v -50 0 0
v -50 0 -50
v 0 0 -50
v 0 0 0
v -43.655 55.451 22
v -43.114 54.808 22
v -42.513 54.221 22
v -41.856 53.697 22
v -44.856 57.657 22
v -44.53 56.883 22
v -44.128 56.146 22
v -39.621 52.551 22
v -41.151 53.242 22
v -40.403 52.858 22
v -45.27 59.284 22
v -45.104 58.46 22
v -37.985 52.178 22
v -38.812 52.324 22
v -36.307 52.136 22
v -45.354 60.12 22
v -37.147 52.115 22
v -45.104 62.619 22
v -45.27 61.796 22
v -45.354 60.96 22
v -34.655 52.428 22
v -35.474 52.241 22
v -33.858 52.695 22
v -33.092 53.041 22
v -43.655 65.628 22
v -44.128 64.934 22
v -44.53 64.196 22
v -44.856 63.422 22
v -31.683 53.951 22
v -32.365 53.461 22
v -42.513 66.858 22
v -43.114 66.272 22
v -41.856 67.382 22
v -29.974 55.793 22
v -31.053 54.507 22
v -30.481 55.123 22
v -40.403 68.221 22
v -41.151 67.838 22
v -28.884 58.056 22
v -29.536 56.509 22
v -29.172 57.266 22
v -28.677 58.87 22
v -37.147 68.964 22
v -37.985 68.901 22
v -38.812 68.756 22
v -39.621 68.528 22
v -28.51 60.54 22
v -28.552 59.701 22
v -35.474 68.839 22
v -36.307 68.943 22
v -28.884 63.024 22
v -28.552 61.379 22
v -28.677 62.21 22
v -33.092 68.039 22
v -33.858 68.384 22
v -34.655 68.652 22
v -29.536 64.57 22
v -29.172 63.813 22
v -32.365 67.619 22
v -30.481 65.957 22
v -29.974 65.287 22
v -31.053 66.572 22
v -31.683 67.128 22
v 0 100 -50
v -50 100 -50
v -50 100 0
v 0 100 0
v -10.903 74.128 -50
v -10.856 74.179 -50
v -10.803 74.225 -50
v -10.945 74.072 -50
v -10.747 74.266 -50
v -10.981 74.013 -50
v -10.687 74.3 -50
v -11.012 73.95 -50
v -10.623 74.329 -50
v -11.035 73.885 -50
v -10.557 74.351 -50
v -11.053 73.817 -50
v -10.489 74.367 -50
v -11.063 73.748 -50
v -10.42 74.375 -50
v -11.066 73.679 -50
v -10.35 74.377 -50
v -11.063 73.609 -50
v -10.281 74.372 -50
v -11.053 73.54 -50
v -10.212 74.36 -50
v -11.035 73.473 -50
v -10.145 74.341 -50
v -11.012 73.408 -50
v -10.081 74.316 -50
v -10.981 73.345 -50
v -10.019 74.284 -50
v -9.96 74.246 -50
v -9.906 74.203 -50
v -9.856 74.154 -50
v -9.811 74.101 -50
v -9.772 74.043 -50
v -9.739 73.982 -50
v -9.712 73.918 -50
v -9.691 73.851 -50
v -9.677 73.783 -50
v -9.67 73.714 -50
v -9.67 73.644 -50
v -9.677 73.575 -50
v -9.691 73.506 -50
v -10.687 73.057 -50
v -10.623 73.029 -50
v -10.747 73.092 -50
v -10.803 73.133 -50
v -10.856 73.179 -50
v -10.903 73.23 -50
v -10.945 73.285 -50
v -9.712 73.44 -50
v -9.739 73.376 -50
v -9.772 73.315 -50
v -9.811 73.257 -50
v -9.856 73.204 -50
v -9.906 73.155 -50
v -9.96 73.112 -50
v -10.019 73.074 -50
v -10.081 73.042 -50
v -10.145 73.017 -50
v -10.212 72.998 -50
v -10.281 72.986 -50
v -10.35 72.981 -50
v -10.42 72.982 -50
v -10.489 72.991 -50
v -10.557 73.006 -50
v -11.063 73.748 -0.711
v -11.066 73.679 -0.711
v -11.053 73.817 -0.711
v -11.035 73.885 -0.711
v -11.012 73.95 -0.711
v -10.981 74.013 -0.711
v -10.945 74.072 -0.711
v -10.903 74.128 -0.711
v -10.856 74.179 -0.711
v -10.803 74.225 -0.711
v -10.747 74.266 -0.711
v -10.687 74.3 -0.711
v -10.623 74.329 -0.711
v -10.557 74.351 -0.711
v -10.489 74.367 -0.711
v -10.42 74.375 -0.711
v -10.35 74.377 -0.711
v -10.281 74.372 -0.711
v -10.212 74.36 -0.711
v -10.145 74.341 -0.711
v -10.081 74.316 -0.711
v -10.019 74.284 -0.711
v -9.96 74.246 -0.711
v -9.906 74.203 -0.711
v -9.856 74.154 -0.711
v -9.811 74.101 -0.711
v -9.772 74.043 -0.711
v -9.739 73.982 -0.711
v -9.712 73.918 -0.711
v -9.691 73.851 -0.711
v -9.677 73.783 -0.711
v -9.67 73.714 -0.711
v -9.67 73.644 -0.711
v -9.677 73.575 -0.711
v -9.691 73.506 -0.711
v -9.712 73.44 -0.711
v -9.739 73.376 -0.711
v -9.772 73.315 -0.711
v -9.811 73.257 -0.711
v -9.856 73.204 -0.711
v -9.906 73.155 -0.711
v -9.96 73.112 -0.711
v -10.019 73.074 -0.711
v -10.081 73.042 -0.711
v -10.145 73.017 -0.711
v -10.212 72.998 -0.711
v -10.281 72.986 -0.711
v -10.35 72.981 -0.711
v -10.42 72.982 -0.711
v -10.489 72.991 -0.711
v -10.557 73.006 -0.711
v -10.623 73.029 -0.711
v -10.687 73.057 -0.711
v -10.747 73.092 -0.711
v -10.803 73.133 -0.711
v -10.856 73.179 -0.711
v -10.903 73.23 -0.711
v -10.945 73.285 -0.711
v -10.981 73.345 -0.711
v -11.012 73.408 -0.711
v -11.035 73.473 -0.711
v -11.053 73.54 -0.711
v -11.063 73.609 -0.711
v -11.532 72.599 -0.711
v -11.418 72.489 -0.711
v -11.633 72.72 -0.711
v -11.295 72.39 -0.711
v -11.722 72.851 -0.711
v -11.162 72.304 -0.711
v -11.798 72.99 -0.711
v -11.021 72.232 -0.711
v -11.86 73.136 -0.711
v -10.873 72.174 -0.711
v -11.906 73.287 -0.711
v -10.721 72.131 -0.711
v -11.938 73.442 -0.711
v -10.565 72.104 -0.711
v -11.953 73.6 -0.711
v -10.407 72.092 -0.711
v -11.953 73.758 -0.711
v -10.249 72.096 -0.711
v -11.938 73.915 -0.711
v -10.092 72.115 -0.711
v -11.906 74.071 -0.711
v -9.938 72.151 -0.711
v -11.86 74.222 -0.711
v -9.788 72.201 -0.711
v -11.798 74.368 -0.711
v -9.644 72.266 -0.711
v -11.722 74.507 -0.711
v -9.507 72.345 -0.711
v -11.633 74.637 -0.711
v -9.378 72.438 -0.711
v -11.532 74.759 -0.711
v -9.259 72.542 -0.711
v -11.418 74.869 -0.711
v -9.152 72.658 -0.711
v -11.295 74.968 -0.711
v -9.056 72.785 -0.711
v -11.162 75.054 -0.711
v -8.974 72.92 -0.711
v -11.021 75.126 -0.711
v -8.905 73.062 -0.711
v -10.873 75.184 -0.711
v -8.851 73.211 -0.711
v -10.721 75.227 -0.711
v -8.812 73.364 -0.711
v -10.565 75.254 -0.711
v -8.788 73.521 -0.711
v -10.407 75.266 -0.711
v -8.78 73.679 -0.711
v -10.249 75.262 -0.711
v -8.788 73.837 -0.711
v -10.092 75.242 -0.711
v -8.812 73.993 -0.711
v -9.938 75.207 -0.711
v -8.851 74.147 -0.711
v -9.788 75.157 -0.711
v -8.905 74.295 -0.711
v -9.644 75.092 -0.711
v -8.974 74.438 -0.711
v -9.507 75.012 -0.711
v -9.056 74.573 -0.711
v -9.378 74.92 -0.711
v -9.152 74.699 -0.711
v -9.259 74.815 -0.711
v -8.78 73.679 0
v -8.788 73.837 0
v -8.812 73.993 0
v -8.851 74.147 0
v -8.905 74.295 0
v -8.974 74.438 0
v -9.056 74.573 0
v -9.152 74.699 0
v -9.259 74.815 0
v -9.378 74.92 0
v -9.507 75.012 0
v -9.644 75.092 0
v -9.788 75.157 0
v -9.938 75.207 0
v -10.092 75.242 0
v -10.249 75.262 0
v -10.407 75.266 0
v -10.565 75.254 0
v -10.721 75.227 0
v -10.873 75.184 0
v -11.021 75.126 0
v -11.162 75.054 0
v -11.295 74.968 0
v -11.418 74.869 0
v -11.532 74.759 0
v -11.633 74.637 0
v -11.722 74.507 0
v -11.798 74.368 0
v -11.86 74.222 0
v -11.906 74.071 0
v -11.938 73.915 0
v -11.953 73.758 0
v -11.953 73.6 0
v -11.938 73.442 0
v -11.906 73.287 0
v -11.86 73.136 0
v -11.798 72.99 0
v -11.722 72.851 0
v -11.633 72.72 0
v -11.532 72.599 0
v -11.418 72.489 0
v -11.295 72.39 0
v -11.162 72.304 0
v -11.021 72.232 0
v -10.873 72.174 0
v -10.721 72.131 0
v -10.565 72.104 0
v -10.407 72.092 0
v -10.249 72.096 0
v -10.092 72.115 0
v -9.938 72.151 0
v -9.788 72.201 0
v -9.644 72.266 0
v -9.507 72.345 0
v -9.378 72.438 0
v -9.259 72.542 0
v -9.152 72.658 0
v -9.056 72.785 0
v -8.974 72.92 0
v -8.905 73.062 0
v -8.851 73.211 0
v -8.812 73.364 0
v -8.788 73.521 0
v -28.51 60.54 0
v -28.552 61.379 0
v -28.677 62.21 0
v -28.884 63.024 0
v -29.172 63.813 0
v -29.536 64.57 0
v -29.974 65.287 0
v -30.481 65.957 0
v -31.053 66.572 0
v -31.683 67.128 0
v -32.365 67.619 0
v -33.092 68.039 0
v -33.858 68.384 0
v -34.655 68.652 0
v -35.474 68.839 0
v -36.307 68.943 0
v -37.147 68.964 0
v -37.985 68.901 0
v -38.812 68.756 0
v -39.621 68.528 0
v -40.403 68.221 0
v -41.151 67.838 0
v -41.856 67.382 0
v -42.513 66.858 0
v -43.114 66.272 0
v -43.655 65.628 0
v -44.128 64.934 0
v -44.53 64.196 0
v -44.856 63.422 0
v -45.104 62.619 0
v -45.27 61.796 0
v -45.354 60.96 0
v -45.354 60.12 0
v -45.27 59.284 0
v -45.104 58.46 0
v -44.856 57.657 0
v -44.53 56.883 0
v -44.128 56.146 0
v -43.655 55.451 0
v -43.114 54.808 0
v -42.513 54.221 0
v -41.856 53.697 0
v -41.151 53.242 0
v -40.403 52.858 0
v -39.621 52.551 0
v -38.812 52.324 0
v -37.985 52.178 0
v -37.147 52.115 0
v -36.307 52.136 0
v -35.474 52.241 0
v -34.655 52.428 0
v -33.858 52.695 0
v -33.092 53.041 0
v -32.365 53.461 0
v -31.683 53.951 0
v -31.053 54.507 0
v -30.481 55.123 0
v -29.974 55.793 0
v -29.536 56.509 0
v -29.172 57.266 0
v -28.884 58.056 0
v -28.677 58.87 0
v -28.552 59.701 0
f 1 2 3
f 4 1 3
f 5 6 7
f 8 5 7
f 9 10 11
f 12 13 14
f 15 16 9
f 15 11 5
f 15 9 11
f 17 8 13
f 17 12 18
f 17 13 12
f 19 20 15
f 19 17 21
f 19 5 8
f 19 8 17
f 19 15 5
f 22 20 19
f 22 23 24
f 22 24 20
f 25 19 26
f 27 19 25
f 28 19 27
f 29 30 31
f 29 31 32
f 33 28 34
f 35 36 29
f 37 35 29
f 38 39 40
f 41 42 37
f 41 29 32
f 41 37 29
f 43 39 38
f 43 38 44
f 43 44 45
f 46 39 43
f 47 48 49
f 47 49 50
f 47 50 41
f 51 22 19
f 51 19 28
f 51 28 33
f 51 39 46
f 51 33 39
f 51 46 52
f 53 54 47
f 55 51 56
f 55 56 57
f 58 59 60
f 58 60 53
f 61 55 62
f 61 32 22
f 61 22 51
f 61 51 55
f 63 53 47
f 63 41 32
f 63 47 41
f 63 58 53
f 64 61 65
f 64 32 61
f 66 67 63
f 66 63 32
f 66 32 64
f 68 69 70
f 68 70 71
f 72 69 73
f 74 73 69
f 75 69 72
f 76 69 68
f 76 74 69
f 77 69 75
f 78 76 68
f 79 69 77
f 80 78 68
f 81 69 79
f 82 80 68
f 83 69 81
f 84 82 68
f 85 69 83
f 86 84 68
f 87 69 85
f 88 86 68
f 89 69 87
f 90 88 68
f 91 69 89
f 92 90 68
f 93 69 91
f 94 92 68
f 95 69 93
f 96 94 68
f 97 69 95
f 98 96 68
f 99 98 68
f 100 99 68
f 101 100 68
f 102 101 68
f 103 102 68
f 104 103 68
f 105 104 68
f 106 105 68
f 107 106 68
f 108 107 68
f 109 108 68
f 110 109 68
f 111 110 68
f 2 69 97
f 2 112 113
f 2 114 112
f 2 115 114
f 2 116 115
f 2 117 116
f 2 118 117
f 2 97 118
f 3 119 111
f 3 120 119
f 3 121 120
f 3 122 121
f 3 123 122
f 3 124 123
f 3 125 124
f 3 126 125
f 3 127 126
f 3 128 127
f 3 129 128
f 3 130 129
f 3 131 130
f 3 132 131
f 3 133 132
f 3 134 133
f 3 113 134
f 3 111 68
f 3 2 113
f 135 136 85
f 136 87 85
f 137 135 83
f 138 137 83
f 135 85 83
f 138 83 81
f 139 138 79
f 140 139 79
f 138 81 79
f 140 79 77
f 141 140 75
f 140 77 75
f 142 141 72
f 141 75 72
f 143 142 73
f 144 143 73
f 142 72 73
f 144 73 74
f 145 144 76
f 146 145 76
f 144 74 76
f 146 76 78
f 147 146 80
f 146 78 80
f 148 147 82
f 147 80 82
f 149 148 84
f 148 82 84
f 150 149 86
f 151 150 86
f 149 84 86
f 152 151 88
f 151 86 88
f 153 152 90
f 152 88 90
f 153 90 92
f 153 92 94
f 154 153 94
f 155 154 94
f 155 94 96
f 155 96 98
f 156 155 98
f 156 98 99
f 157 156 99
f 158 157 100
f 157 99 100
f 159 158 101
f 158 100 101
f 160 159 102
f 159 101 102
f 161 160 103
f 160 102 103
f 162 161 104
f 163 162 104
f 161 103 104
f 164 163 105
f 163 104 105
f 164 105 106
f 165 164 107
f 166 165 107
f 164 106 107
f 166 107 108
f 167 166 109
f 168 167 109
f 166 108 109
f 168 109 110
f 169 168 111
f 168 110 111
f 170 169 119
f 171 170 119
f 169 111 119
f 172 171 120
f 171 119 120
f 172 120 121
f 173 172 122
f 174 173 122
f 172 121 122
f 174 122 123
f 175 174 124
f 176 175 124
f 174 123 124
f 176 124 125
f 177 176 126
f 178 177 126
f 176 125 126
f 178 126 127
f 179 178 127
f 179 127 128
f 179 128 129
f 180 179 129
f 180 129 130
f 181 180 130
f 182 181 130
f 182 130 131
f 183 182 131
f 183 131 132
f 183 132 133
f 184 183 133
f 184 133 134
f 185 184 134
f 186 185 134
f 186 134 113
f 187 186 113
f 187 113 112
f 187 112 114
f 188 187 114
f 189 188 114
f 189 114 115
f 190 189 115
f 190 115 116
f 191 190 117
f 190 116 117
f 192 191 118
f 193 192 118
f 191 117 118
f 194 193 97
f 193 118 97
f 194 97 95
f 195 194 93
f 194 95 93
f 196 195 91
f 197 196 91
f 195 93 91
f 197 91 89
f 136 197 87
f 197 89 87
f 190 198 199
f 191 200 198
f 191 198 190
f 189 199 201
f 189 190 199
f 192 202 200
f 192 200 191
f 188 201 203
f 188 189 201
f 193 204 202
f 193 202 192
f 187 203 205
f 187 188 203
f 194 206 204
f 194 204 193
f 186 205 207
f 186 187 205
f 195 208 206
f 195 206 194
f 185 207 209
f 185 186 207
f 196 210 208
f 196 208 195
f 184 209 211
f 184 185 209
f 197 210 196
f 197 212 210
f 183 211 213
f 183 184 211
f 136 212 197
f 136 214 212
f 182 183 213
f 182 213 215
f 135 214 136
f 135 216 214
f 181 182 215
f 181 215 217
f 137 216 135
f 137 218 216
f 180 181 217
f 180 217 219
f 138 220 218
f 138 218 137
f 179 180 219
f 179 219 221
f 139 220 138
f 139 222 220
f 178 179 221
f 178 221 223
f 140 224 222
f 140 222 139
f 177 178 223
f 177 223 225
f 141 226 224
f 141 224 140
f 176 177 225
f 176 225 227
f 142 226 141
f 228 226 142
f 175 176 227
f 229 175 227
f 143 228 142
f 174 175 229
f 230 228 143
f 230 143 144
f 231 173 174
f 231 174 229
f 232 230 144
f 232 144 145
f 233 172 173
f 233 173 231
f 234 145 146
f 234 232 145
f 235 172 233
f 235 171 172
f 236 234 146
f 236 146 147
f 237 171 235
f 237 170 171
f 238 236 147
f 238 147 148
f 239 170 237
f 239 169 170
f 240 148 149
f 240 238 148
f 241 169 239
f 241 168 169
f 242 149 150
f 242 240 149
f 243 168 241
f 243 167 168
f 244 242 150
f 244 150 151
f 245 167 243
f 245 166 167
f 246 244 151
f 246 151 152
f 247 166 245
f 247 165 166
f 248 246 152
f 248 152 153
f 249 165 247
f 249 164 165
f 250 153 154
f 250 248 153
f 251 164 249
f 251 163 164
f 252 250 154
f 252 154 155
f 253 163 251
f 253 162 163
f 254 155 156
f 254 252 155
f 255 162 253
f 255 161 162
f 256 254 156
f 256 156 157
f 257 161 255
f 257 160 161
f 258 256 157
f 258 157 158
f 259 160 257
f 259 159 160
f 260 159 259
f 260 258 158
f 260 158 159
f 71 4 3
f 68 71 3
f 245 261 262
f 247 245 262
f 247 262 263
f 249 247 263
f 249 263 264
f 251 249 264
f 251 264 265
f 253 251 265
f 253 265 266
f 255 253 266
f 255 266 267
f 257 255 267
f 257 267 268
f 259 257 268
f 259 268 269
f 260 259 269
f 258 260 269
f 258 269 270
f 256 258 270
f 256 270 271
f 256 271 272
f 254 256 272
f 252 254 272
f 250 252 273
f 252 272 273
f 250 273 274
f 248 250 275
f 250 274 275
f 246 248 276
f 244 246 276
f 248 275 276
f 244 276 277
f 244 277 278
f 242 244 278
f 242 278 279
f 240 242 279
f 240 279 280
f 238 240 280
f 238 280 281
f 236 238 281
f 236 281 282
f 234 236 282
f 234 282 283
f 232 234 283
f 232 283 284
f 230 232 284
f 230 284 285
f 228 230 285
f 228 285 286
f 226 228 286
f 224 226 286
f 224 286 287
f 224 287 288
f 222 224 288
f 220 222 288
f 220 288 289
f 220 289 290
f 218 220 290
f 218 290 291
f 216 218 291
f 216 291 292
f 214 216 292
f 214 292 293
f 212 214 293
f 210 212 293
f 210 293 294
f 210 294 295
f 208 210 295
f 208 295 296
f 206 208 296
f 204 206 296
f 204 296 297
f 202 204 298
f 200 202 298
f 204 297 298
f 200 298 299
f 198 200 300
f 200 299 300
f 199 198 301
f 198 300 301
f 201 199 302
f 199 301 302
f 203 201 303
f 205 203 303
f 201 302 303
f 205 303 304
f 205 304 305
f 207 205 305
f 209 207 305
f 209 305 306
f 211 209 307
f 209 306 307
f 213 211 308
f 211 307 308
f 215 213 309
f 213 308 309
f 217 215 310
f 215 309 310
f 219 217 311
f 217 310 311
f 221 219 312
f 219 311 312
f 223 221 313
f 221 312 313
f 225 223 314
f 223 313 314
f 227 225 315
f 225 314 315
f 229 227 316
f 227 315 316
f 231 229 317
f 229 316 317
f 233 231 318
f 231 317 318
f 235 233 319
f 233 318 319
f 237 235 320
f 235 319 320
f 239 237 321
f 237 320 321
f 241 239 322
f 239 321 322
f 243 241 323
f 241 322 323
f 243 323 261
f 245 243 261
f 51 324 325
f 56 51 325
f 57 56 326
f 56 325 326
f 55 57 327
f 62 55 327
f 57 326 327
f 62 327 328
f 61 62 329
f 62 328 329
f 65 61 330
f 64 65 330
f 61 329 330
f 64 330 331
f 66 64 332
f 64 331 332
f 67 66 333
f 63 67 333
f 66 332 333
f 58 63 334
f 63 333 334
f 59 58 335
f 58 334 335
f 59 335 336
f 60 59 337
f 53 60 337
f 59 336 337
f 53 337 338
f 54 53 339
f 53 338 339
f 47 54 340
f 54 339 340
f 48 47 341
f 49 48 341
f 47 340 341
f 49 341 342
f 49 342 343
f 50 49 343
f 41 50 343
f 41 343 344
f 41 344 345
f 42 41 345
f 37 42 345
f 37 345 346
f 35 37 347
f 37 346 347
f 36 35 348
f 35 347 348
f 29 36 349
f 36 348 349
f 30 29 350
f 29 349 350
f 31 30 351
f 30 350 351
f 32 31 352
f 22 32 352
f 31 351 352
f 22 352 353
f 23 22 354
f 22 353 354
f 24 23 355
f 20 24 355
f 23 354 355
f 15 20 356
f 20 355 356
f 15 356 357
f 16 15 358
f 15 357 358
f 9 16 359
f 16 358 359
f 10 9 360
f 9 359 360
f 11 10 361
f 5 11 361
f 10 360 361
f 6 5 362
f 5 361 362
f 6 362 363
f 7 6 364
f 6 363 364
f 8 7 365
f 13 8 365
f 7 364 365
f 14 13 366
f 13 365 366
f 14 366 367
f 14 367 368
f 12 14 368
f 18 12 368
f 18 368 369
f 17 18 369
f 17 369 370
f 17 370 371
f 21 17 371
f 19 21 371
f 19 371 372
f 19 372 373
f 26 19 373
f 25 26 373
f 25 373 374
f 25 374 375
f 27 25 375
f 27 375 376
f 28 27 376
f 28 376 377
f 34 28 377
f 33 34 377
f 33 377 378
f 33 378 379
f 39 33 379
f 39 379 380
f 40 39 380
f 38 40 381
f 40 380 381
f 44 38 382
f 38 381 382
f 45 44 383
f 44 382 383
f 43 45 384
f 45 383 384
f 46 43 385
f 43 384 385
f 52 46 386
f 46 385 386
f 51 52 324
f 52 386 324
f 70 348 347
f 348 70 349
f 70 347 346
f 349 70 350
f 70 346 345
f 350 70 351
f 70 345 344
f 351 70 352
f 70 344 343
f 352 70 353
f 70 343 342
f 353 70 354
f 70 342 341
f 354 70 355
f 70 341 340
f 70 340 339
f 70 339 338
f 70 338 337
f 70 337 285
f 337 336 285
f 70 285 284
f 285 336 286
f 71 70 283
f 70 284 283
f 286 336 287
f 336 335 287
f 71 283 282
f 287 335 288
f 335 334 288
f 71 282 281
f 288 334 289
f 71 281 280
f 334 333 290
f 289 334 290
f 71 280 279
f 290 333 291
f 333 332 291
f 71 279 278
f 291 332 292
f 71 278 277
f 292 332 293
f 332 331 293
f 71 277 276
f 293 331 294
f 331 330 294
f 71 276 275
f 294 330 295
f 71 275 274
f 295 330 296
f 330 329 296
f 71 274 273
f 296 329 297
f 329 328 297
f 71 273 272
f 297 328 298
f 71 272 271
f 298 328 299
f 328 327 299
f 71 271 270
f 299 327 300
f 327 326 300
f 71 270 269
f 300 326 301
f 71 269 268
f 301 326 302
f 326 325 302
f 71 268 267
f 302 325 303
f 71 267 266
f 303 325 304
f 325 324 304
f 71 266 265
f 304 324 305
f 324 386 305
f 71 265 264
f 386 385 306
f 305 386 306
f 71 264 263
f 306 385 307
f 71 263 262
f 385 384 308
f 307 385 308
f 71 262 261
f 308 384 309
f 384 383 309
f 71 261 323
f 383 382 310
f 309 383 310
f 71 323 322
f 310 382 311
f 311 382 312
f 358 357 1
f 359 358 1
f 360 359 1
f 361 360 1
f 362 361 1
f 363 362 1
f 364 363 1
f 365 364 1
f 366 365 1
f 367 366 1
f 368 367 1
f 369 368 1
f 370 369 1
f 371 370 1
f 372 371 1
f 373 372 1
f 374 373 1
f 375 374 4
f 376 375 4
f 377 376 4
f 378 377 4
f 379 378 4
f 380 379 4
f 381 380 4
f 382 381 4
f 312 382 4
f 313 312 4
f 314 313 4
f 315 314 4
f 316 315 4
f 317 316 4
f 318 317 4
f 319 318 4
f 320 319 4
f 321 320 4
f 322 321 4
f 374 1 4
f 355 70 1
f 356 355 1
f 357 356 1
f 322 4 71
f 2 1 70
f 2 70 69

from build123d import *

# Parameters (mm, degrees)
SKETCH1_W                                           = 50
SKETCH1_H                                           = 50
BOSS_EXTRUDE1_DEPTH                                 = 100
SKETCH2_R                                           = 8.427155927
BOSS_EXTRUDE2_DEPTH                                 = 22
CBORE_FOR_00_BINDING_HEAD_MACHINE_SCREW_D           = 1.397
CBORE_FOR_00_BINDING_HEAD_MACHINE_SCREW_CBORE_D     = 3.175
CBORE_FOR_00_BINDING_HEAD_MACHINE_SCREW_CBORE_DEPTH = 0.7112


with BuildPart() as part:
    # Sketch1 → Boss-Extrude1 (new body)
    with BuildSketch(Plane(origin=(0, 0, 0), x_dir=(1, 0, 0), z_dir=(0, 1, 0))):
        with Locations((-25, 25)):
            Rectangle(SKETCH1_W, SKETCH1_H)
    extrude(amount=BOSS_EXTRUDE1_DEPTH)

    # Sketch2 → Boss-Extrude2 (add)
    with BuildSketch(Plane.XY):
        with Locations((-36.936942804, 60.539744496)):
            Circle(SKETCH2_R)
    extrude(amount=BOSS_EXTRUDE2_DEPTH)

    # CBORE for #00 Binding Head Machine Screw1 (through all)
    with Locations(Plane.XY):
        with Locations((-10.367880278, 73.678854219)):
            CounterBoreHole(CBORE_FOR_00_BINDING_HEAD_MACHINE_SCREW_D / 2, CBORE_FOR_00_BINDING_HEAD_MACHINE_SCREW_CBORE_D / 2, CBORE_FOR_00_BINDING_HEAD_MACHINE_SCREW_CBORE_DEPTH)


solid = part.part
